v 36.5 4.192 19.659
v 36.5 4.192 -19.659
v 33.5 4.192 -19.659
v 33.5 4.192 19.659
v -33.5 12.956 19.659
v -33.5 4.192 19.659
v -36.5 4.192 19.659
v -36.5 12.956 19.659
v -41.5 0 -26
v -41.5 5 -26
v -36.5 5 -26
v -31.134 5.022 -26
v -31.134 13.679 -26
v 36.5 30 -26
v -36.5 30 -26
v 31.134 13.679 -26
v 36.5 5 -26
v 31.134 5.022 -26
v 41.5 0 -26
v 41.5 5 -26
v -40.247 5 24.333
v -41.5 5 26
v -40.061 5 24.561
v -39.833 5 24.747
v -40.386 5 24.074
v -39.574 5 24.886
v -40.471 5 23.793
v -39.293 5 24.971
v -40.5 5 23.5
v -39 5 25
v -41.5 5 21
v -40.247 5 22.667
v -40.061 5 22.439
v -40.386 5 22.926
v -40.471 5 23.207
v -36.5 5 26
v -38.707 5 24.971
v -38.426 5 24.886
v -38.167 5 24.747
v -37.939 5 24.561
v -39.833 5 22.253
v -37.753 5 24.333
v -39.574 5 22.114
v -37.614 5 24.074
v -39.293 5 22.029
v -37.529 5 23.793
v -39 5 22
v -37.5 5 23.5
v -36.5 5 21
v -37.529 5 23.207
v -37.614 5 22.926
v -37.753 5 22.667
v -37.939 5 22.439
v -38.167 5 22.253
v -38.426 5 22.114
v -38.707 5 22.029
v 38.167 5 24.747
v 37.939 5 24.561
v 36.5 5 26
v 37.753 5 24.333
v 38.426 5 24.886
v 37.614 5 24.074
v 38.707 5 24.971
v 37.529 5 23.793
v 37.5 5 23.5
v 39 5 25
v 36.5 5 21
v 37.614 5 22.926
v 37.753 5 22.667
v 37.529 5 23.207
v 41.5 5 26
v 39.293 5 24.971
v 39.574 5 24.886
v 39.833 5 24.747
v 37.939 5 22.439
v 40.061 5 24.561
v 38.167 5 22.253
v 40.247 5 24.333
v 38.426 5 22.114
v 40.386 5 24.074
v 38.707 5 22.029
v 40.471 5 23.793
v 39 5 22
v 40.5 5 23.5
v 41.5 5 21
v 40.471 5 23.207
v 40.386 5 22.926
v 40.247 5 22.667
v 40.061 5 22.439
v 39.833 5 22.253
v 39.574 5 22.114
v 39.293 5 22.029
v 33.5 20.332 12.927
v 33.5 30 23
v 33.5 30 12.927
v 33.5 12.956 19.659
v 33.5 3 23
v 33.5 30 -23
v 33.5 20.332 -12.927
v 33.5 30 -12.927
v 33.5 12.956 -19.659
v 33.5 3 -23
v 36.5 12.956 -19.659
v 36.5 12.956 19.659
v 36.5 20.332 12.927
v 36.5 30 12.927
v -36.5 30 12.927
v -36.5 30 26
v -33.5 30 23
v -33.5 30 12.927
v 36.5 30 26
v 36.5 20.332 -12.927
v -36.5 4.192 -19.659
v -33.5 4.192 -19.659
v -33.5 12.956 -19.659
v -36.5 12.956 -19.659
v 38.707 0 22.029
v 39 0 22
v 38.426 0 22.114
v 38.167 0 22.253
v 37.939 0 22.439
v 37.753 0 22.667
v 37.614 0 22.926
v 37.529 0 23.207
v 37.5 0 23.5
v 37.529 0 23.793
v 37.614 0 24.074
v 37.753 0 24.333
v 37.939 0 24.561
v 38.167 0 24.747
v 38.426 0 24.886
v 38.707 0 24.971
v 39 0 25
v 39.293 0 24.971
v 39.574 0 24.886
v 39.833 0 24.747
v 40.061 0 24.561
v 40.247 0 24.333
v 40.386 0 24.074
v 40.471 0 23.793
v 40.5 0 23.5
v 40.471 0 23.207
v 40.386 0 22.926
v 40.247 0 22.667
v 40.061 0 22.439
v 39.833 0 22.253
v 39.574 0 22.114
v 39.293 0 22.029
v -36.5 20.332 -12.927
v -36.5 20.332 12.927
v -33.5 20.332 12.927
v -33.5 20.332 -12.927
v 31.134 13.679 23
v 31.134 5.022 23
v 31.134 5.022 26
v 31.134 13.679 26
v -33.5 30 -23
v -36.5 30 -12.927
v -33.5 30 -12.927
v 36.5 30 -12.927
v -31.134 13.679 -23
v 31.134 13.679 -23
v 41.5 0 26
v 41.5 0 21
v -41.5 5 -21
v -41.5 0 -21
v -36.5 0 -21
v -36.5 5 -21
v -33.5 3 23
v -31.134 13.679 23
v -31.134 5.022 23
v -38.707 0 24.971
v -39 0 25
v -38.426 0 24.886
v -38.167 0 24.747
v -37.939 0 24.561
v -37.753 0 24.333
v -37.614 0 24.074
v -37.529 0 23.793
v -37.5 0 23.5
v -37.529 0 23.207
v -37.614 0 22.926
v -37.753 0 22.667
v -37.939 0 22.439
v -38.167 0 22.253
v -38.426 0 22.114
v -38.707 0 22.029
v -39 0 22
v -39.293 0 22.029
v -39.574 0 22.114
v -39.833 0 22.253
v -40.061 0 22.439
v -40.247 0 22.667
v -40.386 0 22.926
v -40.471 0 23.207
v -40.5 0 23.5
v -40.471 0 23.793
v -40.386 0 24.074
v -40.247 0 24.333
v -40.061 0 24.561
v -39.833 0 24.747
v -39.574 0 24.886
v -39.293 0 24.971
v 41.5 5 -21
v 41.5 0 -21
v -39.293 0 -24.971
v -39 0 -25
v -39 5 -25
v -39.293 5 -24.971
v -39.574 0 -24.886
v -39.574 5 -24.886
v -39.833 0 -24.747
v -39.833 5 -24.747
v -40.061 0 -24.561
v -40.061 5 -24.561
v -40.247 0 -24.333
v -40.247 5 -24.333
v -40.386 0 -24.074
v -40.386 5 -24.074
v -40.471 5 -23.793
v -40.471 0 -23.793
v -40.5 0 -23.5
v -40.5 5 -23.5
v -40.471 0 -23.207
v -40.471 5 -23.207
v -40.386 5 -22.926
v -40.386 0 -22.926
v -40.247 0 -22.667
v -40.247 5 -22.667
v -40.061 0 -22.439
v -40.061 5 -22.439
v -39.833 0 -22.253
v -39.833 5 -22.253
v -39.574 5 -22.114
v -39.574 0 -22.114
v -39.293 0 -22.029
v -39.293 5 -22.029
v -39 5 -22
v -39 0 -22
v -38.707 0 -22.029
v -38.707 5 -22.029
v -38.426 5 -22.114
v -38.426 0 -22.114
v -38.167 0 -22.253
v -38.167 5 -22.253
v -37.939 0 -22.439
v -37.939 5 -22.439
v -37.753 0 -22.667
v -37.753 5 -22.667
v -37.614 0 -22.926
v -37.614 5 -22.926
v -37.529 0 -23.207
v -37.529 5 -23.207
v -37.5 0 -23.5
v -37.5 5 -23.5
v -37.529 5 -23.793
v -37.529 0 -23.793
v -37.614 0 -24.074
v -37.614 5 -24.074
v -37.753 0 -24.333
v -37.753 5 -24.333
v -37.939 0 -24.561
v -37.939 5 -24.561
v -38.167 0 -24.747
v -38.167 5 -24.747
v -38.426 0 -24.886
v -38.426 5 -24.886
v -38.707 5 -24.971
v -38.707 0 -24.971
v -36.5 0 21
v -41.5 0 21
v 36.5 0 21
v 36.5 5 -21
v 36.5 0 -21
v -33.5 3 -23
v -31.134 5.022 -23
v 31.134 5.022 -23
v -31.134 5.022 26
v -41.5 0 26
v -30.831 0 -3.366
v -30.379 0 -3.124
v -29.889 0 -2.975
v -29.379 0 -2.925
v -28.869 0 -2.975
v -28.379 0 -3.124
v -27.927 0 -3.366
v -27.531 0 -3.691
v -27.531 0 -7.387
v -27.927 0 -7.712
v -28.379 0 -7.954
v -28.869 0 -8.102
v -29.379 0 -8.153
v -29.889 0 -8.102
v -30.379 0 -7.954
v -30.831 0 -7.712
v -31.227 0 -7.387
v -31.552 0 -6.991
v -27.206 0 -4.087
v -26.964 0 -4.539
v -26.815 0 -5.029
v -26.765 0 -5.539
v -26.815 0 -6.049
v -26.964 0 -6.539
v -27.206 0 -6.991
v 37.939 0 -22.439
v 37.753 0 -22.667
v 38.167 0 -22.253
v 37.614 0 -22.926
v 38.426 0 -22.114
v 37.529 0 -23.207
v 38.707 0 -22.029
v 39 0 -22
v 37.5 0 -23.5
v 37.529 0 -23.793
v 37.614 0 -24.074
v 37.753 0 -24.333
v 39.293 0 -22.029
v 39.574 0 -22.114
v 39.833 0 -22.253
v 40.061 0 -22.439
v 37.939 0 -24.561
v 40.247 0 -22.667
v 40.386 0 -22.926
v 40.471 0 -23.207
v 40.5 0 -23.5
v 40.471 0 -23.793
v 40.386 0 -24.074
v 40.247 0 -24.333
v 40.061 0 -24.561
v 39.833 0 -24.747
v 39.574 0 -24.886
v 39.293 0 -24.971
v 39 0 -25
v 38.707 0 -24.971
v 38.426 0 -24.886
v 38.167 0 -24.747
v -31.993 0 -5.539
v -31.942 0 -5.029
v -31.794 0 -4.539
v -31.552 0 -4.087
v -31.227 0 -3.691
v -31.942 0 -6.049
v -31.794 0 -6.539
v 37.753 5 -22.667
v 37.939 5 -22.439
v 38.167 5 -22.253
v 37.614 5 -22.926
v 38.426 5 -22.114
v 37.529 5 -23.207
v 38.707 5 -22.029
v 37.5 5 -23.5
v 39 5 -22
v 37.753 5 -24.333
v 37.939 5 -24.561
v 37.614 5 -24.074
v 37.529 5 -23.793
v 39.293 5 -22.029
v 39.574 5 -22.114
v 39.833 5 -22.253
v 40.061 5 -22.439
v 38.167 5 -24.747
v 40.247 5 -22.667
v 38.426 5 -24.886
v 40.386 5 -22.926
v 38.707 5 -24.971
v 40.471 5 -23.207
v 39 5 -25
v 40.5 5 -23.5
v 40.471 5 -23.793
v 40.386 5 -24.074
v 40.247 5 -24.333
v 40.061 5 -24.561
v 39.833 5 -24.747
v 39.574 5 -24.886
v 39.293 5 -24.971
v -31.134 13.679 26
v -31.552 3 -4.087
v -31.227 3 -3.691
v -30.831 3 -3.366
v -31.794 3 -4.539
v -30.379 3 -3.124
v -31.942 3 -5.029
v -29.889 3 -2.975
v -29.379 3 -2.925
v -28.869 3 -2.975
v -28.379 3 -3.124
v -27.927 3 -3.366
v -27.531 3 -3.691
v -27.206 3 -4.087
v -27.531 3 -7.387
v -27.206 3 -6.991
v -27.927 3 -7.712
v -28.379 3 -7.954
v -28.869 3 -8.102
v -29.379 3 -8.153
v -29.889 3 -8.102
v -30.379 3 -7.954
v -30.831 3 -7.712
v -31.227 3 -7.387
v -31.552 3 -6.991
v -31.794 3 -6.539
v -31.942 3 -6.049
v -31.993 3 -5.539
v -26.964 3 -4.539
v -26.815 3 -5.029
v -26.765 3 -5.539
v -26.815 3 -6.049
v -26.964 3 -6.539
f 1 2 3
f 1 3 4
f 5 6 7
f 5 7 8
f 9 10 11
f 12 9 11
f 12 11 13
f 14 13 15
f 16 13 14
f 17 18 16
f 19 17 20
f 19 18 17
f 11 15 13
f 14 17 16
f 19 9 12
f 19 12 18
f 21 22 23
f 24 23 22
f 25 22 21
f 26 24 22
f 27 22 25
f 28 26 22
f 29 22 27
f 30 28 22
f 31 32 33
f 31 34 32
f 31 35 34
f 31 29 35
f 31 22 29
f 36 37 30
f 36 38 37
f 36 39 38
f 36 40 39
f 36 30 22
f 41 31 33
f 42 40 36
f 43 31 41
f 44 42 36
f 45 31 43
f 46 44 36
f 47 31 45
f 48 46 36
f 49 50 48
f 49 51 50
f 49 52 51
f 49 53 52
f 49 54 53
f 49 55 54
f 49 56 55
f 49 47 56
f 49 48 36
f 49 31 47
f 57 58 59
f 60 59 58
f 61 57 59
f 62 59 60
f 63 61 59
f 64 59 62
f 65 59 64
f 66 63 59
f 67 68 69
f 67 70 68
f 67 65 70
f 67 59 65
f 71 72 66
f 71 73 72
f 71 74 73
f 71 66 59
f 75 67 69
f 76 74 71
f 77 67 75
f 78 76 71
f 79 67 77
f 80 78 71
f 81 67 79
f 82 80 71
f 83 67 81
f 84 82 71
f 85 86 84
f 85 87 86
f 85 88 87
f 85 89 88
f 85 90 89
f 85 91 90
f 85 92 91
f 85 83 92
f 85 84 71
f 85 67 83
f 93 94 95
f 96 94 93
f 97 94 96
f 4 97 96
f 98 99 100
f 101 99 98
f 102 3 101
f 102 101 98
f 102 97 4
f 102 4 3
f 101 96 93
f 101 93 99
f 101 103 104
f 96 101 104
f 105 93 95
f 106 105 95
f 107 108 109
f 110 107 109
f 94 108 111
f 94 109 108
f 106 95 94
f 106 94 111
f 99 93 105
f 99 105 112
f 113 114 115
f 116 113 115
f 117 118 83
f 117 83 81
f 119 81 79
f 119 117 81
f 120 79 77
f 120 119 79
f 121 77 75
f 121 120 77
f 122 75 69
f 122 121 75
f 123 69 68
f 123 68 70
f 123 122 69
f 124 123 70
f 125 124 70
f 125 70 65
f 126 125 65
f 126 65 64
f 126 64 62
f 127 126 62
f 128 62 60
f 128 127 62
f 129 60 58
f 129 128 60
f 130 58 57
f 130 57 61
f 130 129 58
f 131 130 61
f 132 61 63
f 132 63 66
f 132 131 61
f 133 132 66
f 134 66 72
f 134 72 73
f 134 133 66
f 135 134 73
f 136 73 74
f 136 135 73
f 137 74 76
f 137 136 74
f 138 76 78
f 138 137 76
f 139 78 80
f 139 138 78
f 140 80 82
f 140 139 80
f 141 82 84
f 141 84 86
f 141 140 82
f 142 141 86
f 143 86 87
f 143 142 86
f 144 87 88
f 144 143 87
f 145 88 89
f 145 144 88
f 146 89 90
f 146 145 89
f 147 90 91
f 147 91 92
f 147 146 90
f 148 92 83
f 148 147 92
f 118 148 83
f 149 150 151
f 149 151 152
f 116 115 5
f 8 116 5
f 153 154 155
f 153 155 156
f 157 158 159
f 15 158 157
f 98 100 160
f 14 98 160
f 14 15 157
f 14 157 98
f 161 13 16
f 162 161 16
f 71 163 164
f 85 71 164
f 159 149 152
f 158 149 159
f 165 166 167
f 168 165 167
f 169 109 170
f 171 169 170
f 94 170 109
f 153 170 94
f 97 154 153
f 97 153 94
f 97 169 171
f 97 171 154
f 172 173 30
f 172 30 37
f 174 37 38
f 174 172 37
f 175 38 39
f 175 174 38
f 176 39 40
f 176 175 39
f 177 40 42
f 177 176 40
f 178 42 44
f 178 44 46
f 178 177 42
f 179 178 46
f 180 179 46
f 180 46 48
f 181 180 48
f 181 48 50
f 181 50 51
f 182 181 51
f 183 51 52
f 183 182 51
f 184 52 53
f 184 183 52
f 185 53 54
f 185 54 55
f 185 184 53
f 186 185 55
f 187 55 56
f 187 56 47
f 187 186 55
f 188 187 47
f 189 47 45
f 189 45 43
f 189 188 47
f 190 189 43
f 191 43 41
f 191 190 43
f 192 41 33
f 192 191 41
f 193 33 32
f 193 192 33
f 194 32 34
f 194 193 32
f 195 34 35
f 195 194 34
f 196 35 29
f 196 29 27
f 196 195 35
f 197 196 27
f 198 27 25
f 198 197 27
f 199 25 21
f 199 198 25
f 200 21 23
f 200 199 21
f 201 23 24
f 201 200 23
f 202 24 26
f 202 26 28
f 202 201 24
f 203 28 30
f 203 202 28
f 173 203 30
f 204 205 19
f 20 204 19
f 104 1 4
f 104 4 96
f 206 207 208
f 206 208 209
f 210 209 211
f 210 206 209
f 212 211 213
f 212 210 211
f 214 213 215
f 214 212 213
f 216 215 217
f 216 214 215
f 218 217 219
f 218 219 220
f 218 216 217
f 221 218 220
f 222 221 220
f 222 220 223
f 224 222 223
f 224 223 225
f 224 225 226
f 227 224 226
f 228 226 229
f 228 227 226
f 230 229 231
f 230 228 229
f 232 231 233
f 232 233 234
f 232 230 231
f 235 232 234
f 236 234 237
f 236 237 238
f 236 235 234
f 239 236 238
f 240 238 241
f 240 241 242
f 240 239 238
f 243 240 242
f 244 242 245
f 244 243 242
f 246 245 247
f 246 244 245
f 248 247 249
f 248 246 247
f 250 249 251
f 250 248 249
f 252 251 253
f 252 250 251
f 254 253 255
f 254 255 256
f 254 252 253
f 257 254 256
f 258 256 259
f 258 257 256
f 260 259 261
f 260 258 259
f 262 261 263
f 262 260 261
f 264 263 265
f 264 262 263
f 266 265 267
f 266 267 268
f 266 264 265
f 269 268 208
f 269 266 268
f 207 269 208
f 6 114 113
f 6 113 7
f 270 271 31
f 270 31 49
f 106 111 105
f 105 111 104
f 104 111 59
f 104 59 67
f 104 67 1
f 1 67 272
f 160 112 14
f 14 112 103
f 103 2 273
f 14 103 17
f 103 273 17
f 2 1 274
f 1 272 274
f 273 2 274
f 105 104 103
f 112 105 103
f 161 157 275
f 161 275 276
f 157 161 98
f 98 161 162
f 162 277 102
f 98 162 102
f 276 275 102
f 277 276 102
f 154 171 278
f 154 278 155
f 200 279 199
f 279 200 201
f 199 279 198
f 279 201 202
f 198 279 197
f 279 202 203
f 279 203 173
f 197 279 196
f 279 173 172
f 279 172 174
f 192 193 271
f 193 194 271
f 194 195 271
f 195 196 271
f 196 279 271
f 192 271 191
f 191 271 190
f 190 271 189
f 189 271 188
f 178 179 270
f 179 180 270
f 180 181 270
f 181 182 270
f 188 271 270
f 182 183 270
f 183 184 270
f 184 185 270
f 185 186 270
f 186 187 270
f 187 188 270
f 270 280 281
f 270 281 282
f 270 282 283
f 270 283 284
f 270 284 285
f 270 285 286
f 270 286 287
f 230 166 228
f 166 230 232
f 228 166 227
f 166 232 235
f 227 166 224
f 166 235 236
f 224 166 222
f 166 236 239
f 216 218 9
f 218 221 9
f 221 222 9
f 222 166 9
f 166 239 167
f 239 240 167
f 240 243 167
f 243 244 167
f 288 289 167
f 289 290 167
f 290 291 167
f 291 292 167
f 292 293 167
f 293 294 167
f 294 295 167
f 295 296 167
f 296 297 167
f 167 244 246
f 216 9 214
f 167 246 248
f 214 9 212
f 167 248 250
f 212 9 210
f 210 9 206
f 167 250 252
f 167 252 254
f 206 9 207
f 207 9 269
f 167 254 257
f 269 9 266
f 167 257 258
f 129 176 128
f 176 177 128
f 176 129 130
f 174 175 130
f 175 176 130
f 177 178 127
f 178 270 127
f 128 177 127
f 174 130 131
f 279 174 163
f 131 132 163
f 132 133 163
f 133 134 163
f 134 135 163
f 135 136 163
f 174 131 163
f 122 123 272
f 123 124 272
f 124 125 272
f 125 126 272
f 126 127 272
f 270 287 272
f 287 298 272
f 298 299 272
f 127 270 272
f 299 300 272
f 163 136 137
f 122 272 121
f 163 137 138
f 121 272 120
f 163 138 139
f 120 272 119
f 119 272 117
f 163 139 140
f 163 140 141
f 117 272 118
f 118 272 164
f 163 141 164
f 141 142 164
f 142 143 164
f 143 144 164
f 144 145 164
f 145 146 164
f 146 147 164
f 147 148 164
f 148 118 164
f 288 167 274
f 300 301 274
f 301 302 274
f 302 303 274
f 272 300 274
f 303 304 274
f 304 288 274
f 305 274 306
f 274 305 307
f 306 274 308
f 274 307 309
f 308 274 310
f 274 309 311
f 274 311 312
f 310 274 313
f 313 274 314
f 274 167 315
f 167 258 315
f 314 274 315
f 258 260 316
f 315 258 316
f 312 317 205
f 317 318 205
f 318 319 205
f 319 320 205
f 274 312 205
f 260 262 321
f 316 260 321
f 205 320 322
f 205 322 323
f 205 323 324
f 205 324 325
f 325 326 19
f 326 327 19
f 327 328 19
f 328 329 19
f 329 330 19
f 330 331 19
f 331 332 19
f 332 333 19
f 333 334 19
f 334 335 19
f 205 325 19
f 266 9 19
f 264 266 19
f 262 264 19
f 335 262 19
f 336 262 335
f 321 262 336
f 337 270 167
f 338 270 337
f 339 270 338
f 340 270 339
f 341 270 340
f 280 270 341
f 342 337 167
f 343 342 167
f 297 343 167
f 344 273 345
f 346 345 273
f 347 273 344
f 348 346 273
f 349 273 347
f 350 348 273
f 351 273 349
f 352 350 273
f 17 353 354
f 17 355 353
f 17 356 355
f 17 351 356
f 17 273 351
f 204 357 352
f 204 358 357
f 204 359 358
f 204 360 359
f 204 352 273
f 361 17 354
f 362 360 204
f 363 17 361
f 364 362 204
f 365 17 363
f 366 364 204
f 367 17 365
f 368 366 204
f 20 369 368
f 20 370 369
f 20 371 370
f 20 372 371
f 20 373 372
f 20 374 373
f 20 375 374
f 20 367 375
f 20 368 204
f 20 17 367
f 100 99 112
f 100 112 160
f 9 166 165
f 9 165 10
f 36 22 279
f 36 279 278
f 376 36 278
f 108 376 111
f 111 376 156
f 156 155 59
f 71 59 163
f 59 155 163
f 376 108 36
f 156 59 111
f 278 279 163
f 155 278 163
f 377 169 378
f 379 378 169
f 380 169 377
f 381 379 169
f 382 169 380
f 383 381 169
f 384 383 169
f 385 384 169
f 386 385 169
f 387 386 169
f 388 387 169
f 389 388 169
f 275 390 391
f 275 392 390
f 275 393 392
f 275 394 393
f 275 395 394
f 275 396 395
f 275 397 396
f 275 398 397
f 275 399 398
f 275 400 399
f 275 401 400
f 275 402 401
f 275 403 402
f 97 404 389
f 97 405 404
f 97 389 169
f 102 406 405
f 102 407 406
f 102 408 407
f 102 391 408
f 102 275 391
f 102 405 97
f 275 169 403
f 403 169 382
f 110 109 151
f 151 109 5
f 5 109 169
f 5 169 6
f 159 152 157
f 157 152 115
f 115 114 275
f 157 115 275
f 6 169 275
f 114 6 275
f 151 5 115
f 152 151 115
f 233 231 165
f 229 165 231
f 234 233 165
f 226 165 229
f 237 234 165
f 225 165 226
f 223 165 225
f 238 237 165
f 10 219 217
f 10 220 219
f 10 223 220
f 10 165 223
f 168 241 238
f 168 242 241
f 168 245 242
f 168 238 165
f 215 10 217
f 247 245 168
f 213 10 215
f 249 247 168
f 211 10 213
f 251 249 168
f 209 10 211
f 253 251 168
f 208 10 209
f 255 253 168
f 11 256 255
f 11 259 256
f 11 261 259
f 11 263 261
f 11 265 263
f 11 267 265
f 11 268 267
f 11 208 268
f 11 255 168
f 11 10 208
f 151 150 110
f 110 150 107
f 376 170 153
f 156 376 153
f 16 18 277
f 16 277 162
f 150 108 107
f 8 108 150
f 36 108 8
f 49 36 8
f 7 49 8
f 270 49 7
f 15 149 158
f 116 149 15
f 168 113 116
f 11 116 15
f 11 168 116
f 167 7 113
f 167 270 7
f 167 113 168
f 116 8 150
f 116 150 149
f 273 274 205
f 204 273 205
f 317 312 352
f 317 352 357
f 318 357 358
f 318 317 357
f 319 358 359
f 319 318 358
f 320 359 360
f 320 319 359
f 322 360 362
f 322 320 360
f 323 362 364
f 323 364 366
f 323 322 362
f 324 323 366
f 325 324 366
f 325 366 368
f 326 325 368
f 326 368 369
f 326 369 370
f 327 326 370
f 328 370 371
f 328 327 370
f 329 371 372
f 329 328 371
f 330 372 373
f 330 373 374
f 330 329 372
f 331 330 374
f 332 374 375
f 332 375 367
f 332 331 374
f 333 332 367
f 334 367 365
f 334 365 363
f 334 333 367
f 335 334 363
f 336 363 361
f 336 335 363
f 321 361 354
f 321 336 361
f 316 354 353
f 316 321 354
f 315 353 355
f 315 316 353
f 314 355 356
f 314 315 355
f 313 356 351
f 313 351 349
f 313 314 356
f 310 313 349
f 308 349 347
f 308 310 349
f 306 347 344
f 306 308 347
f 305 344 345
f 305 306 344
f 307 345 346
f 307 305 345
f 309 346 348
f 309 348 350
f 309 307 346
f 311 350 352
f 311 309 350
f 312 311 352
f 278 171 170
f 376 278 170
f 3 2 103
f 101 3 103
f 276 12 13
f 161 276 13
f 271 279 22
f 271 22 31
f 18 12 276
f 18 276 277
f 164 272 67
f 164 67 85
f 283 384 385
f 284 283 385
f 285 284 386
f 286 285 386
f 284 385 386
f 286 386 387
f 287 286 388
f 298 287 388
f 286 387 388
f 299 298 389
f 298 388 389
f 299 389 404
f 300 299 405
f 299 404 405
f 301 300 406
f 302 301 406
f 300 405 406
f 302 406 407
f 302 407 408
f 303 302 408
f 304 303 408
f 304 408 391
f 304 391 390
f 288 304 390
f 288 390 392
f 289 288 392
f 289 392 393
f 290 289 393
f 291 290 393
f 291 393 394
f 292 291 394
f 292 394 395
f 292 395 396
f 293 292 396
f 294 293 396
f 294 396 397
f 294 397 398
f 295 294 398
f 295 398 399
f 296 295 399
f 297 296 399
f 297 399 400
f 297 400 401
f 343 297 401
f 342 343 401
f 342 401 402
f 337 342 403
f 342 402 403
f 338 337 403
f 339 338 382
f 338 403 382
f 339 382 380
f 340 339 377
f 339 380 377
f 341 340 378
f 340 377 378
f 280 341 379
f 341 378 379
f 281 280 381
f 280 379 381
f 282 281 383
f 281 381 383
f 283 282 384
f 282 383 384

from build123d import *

# Parameters (mm, degrees)
SKETCH_1_W               = 73
SKETCH_1_H               = 52
SKETCH_1_W_2             = 67
SKETCH_1_H_2             = 46
EXTRUDE_1_DEPTH          = 30
SKETCH_1_2_W             = 67
SKETCH_1_2_H             = 46
EXTRUDE_2_DEPTH          = 3
CUT_EXTRUDE_1_DEPTH      = 69.067980725
CUT_EXTRUDE_1_DEPTH_BACK = 69.067980725
SKETCH_2_W               = 62.268542554
SKETCH_2_H               = 8.657438287
SKETCH_3_W               = 5
SKETCH_3_H               = 5
SKETCH_3_R               = 1.5
EXTRUDE_3_DEPTH          = 5
CUT_EXTRUDE_2_DEPTH      = 85.858706094
CUT_EXTRUDE_2_DEPTH_BACK = 85.858706094
SKETCH_4_W               = 39.317133882
SKETCH_4_H               = 8.764149171
CUT_EXTRUDE_3_DEPTH      = 88.521425948
CUT_EXTRUDE_3_DEPTH_BACK = 88.521425948
SKETCH_5_W               = 25.853493498
SKETCH_5_H               = 9.668476694
SKETCH_6_R               = 2.613718533
CUT_EXTRUDE_4_DEPTH      = 56.921820428


with BuildPart() as part:
    # 草图1 → 凸台-拉伸1 (new body)
    with BuildSketch(Plane(origin=(0, 0, 0), x_dir=(1, 0, 0), z_dir=(0, 1, 0))):
        Rectangle(SKETCH_1_W, SKETCH_1_H)
        Rectangle(SKETCH_1_W_2, SKETCH_1_H_2, mode=Mode.SUBTRACT)
    extrude(amount=EXTRUDE_1_DEPTH)

    # 草图1<2> → 凸台-拉伸2 (add)
    with BuildSketch(Plane(origin=(0, 0, 0), x_dir=(1, 0, 0), z_dir=(0, 1, 0))):
        Rectangle(SKETCH_1_2_W, SKETCH_1_2_H)
    extrude(amount=EXTRUDE_2_DEPTH)

    # 草图2 → 切除-拉伸1 (cut, two sides: drawn at the far end of the back side and taken through both)
    with BuildSketch(Plane.XY.offset(-23).offset(-CUT_EXTRUDE_1_DEPTH_BACK)):
        with Locations((0, 9.350523915)):
            Rectangle(SKETCH_2_W, SKETCH_2_H)
    extrude(amount=CUT_EXTRUDE_1_DEPTH + CUT_EXTRUDE_1_DEPTH_BACK, mode=Mode.SUBTRACT)

    # 草图3 → 凸台-拉伸3 (add)
    # profile 1 of 4: a face of its own
    with BuildSketch(Plane(origin=(0, 0, 0), x_dir=(1, 0, 0), z_dir=(0, 1, 0))):
        with Locations((39, 23.5)):
            Rectangle(SKETCH_3_W, SKETCH_3_H)
        with Locations((39, 23.5)):
            Circle(SKETCH_3_R, mode=Mode.SUBTRACT)
    # profile 2 of 4: a face of its own
    with BuildSketch(Plane(origin=(0, 0, 0), x_dir=(1, 0, 0), z_dir=(0, 1, 0))):
        with Locations((39, -23.5)):
            Rectangle(SKETCH_3_W, SKETCH_3_H)
        with Locations((39, -23.5)):
            Circle(SKETCH_3_R, mode=Mode.SUBTRACT)
    # profile 3 of 4: a face of its own
    with BuildSketch(Plane(origin=(0, 0, 0), x_dir=(1, 0, 0), z_dir=(0, 1, 0))):
        with Locations((-39, -23.5)):
            Rectangle(SKETCH_3_W, SKETCH_3_H)
        with Locations((-39, -23.5)):
            Circle(SKETCH_3_R, mode=Mode.SUBTRACT)
    # profile 4 of 4: a face of its own
    with BuildSketch(Plane(origin=(0, 0, 0), x_dir=(1, 0, 0), z_dir=(0, 1, 0))):
        with Locations((-39, 23.5)):
            Rectangle(SKETCH_3_W, SKETCH_3_H)
        with Locations((-39, 23.5)):
            Circle(SKETCH_3_R, mode=Mode.SUBTRACT)
    extrude(amount=EXTRUDE_3_DEPTH)

    # 草图4 → 切除-拉伸2 (cut, two sides: drawn at the far end of the back side and taken through both)
    with BuildSketch(Plane.ZY.offset(-33.5).offset(-CUT_EXTRUDE_2_DEPTH_BACK)):
        with Locations((0, 8.573599651)):
            Rectangle(SKETCH_4_W, SKETCH_4_H)
    extrude(amount=CUT_EXTRUDE_2_DEPTH + CUT_EXTRUDE_2_DEPTH_BACK, mode=Mode.SUBTRACT)

    # 草图5 → 切除-拉伸3 (cut, two sides: drawn at the far end of the back side and taken through both)
    with BuildSketch(Plane(origin=(36.5, 0, 0), x_dir=(0, 0, -1), z_dir=(1, 0, 0)).offset(-CUT_EXTRUDE_3_DEPTH_BACK)):
        with Locations((0, 25.165761653)):
            Rectangle(SKETCH_5_W, SKETCH_5_H)
    extrude(amount=CUT_EXTRUDE_3_DEPTH + CUT_EXTRUDE_3_DEPTH_BACK, mode=Mode.SUBTRACT)

    # 草图6 → 切除-拉伸4 (cut, through all)
    with BuildSketch(Plane(origin=(0, 3, 0), x_dir=(1, 0, 0), z_dir=(0, 1, 0))):
        with Locations((-29.37891044, 5.538923259)):
            Circle(SKETCH_6_R)
    extrude(amount=-CUT_EXTRUDE_4_DEPTH, mode=Mode.SUBTRACT)


solid = part.part
